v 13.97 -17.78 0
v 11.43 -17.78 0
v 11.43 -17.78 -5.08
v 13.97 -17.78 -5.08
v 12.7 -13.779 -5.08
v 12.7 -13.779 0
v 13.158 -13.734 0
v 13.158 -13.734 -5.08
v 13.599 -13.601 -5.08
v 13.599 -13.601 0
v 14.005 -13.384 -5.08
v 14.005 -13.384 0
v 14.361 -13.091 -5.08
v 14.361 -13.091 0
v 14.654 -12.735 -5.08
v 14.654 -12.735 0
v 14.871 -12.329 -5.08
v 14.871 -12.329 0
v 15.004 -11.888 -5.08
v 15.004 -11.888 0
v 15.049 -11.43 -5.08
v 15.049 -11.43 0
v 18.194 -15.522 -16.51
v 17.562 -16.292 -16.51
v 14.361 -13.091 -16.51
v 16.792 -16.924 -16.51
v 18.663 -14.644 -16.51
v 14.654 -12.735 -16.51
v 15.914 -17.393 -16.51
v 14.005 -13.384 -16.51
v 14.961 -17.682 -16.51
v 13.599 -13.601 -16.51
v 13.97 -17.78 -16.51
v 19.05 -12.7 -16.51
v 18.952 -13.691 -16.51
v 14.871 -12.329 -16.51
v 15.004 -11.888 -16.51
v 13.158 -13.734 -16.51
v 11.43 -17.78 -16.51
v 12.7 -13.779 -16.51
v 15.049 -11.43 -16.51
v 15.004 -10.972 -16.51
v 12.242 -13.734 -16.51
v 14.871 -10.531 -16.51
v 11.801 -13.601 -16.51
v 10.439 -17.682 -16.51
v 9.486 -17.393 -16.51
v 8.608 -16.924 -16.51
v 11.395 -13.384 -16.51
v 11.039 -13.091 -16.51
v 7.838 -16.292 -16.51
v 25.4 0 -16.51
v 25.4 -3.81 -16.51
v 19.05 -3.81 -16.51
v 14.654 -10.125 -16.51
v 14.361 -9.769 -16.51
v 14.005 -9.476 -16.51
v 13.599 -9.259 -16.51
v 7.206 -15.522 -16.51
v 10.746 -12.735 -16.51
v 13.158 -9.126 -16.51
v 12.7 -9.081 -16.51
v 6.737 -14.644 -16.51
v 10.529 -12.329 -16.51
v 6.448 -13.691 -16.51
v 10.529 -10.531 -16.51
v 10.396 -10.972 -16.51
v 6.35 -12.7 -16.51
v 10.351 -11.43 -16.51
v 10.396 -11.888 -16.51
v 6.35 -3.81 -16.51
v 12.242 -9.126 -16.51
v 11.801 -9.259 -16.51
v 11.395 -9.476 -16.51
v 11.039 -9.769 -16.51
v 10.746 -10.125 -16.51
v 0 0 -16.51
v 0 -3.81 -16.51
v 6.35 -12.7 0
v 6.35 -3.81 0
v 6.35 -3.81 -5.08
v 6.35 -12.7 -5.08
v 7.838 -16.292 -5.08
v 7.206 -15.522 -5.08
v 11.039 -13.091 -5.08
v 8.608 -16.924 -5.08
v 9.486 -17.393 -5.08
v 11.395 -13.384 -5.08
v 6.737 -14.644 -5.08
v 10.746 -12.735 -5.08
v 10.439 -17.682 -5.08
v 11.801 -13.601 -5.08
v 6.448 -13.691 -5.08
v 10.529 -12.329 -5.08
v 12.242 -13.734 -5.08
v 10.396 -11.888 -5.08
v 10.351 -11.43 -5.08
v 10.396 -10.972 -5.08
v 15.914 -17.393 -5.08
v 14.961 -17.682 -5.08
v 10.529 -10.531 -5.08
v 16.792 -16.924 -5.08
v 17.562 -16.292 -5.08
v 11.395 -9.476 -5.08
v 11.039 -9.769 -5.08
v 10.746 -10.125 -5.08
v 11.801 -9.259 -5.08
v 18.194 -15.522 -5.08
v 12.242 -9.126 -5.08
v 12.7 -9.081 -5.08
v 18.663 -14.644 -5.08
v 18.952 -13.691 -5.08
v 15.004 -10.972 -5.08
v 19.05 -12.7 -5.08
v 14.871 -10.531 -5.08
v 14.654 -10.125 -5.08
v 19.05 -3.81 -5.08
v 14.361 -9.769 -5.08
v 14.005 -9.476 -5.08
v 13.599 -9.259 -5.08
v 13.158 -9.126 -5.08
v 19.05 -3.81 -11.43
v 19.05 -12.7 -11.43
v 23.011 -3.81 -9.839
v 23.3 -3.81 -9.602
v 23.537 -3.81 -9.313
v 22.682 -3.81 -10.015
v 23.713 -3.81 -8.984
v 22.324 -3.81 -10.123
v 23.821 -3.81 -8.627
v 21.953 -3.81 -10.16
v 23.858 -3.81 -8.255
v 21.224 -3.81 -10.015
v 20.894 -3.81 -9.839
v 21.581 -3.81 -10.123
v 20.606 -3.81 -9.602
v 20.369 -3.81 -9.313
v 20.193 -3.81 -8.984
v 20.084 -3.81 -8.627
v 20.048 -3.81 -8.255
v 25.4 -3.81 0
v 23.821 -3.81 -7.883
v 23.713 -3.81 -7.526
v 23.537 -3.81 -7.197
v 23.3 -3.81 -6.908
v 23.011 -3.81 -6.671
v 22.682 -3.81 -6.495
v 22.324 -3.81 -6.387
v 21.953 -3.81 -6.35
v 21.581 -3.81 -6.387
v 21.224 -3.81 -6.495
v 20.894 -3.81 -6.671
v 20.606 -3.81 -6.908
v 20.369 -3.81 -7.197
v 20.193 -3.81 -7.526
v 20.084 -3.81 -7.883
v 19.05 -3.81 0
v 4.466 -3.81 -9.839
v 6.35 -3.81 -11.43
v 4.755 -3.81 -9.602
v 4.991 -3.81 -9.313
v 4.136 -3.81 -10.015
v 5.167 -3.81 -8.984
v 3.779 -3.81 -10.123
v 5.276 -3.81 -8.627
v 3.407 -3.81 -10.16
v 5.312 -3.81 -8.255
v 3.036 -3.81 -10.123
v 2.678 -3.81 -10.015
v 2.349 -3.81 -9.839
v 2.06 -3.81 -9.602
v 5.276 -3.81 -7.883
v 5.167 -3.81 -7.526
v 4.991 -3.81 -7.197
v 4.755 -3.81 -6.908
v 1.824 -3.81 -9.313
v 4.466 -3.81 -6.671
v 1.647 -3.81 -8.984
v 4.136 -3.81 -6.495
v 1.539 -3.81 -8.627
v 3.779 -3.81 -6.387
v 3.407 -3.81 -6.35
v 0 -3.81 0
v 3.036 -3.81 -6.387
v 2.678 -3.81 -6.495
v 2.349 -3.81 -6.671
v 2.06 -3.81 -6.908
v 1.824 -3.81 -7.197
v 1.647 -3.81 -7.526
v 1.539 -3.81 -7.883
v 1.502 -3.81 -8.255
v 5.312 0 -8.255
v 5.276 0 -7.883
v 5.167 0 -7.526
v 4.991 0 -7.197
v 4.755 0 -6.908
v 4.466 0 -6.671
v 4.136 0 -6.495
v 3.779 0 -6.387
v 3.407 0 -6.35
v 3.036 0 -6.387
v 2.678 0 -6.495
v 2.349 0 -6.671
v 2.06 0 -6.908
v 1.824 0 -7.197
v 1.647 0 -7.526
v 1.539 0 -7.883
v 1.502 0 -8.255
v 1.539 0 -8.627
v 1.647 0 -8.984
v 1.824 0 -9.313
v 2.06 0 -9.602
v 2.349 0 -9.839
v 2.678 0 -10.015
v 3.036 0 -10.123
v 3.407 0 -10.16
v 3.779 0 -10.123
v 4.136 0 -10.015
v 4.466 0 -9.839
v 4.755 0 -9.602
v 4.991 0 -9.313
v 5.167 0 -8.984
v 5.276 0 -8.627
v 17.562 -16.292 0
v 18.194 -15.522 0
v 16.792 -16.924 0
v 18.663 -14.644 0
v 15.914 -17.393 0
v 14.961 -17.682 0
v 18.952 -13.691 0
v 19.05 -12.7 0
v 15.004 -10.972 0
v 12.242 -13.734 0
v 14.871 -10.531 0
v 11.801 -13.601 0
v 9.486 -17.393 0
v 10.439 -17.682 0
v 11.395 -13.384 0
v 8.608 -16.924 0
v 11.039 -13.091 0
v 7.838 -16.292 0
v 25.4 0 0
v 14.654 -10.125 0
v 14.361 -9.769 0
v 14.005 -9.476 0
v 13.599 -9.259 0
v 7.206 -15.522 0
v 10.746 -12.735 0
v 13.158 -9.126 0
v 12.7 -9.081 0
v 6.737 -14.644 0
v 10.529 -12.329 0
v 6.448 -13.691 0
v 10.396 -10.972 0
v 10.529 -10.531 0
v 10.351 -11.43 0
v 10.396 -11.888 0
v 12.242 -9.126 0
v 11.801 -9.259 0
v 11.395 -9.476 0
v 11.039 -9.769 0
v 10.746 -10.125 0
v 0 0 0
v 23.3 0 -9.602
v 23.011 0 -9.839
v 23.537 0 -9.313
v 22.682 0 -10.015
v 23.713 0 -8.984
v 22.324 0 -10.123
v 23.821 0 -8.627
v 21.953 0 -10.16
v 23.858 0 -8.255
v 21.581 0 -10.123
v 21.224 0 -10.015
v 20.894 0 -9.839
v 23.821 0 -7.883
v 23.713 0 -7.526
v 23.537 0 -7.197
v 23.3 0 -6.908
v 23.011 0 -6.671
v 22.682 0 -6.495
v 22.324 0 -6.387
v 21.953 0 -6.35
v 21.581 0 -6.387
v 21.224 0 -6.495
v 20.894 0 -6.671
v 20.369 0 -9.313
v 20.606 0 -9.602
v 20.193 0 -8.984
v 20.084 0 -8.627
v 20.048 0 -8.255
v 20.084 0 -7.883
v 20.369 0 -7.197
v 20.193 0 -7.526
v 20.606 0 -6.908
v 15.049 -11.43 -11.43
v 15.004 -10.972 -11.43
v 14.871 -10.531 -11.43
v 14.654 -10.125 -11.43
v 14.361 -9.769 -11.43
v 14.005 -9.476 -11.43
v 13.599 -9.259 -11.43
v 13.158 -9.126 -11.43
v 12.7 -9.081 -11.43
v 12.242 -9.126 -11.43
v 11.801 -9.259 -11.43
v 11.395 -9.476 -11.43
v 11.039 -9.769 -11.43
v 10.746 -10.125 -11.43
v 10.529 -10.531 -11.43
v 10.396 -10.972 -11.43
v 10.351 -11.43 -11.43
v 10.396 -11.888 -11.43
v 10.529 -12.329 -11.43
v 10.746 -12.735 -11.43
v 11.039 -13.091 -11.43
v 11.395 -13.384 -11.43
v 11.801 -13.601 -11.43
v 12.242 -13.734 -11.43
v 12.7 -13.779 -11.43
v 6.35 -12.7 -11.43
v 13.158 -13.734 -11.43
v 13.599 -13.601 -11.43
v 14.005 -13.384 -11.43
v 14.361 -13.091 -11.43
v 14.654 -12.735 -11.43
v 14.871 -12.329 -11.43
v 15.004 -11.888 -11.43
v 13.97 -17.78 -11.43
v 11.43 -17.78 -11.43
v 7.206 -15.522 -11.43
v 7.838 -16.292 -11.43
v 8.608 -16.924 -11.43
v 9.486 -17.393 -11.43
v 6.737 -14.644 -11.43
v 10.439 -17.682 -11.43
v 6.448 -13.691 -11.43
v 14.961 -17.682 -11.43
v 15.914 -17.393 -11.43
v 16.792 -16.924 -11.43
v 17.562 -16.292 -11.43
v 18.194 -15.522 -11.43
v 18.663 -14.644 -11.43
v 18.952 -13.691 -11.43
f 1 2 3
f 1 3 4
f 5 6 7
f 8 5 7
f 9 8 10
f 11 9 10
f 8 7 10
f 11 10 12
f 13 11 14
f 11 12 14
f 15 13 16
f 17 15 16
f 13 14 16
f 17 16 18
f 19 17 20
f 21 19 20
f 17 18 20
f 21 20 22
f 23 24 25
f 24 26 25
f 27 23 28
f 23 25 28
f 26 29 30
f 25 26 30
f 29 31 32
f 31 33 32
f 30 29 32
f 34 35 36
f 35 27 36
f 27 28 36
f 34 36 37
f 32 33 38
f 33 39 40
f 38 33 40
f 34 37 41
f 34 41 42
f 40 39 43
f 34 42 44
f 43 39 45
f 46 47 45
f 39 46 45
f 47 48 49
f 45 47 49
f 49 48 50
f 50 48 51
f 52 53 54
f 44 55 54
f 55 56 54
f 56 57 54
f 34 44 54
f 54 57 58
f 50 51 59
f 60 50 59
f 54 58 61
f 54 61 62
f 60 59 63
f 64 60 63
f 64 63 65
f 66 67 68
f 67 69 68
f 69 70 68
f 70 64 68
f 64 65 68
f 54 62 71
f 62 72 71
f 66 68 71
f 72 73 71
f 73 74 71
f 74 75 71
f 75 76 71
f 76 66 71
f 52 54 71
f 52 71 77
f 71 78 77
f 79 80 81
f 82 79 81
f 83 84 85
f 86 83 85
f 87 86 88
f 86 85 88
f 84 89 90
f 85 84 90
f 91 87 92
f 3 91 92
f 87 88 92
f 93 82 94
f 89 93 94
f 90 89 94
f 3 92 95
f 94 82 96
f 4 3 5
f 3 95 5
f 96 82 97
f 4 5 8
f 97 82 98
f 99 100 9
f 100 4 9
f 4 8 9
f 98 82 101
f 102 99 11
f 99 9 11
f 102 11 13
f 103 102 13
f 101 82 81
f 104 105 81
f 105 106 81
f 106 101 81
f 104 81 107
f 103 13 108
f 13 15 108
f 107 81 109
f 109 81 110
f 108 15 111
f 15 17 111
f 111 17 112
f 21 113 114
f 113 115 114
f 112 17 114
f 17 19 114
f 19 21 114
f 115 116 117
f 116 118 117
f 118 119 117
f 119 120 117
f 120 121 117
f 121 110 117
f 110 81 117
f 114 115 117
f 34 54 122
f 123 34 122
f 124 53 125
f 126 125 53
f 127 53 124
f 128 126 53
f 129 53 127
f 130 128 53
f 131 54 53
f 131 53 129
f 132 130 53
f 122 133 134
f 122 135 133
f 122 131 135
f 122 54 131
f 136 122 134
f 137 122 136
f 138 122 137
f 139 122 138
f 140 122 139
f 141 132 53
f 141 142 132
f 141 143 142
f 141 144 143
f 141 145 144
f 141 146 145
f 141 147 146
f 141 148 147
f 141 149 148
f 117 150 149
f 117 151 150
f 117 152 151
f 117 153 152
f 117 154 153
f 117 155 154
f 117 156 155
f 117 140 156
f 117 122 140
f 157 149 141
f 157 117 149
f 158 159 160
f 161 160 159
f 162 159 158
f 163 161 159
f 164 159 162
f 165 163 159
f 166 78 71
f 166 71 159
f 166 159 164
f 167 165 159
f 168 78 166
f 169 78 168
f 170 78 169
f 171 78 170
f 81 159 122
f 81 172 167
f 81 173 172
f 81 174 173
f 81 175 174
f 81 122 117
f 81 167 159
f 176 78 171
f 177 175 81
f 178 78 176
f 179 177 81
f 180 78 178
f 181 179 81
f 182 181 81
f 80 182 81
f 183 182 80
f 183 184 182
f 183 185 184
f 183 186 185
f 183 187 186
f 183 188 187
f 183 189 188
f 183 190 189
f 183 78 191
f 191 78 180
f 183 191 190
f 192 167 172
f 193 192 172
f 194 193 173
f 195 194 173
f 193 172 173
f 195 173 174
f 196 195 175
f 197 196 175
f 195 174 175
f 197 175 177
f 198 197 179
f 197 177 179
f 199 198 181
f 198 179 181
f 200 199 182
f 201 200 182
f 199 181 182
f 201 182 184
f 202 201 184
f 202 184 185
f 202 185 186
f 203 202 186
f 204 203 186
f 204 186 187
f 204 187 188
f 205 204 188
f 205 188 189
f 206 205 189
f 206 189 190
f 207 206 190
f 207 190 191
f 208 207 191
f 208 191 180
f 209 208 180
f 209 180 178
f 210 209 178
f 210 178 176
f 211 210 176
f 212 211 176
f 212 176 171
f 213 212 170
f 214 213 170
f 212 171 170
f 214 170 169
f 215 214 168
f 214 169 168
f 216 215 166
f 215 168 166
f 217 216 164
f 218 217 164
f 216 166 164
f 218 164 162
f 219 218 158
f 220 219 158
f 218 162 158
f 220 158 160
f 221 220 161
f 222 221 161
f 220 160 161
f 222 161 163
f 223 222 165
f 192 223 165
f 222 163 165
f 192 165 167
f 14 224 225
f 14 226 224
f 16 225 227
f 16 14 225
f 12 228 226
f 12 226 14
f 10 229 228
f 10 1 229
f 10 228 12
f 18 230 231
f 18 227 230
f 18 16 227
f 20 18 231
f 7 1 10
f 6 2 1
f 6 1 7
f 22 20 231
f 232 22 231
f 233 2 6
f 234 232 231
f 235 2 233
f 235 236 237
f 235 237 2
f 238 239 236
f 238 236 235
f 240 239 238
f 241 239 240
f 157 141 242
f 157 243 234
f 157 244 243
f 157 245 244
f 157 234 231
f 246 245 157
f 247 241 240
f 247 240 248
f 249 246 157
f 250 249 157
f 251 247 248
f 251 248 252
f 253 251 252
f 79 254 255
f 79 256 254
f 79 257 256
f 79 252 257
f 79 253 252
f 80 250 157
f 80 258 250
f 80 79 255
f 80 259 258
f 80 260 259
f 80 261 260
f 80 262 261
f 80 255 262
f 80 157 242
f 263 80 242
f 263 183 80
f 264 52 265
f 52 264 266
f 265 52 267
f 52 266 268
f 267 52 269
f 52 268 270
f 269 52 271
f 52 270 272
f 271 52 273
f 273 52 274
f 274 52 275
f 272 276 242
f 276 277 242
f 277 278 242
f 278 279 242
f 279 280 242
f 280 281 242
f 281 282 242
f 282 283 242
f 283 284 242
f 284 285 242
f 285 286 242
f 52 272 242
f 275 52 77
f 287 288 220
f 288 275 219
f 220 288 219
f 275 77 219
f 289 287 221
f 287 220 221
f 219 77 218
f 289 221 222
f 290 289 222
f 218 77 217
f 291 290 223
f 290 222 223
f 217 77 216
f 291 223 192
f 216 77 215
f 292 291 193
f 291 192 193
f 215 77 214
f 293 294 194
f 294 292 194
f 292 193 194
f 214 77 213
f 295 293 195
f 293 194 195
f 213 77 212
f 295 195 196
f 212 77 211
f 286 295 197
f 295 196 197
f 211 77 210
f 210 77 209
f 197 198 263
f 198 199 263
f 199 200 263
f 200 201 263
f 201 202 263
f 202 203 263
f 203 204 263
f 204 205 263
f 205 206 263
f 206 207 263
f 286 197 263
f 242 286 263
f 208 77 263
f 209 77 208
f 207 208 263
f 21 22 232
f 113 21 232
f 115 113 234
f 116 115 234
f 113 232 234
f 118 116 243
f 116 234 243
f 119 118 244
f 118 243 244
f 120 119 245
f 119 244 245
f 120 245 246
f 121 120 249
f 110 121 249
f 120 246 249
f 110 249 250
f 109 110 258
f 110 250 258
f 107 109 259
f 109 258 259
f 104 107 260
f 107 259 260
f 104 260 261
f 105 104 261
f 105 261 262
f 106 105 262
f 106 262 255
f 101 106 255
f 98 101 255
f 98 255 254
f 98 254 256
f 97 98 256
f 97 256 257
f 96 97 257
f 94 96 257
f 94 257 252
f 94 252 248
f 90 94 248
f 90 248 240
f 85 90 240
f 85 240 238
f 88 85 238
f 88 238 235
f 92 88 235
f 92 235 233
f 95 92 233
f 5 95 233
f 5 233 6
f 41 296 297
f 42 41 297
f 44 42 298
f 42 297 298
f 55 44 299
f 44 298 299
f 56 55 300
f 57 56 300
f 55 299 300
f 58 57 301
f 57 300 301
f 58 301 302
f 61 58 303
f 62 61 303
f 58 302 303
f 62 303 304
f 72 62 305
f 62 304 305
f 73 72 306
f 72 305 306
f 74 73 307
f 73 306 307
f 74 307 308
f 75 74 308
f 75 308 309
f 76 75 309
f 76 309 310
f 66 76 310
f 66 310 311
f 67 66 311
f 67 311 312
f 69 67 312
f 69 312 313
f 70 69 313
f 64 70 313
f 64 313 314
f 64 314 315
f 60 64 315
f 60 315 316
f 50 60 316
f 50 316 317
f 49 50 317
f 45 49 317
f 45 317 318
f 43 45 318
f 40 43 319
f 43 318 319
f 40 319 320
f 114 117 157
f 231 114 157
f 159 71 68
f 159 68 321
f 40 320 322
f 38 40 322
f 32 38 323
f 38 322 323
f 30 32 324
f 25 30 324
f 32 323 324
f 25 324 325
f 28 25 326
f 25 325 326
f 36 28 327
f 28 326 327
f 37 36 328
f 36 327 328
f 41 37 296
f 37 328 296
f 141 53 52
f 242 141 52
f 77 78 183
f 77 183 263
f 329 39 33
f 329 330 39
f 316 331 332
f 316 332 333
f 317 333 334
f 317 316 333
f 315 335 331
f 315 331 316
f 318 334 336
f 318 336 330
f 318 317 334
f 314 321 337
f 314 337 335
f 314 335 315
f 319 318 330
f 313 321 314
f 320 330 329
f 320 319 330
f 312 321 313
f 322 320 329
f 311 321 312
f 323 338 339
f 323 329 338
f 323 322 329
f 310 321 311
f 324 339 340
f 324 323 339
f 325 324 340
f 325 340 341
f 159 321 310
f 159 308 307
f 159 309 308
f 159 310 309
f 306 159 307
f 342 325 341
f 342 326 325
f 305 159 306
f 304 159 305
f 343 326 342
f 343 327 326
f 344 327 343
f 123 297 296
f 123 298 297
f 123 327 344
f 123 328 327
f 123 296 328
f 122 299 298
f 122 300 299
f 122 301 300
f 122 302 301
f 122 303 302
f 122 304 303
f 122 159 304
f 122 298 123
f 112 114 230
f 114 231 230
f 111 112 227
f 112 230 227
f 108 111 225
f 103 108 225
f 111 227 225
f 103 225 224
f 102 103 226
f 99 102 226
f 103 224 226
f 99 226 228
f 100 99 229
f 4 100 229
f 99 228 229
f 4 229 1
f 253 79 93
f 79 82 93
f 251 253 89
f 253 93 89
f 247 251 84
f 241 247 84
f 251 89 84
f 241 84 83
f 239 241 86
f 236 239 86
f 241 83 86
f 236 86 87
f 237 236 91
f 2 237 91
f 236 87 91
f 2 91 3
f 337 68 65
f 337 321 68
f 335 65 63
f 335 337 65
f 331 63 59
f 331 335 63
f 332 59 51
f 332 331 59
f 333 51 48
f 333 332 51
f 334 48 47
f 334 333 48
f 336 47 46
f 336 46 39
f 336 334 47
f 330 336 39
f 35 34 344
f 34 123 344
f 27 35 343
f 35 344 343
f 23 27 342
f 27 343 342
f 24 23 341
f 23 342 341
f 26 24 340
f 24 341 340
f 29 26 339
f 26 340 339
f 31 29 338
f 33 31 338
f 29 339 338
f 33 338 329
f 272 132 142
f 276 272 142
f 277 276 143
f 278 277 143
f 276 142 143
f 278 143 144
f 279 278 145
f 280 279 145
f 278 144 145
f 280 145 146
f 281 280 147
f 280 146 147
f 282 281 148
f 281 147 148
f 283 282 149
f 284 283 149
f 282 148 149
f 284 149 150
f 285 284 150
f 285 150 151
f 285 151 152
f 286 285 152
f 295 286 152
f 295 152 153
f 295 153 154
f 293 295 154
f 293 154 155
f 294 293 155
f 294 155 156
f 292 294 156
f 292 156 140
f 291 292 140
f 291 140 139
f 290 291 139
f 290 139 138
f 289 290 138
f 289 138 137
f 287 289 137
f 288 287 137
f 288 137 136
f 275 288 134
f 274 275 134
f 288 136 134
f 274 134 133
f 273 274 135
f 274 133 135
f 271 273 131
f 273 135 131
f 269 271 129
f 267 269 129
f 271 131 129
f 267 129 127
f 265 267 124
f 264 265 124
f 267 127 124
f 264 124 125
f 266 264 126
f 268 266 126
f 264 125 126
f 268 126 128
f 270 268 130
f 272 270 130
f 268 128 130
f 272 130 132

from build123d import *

# Parameters (mm, degrees)
F0_W     = 3.81
F0_H     = 16.51
F1_DEPTH = 25.4
F2_W     = 12.7
F2_H     = 5.08
F3_DEPTH = 13.97
F4_R     = 5.08
F6_DEPTH = 25.4
F7_R     = 1.905
F8_DEPTH = 25.4


with BuildPart() as f1:
    # F0 (on Right) → F1 (new body)
    with BuildSketch(Plane.YZ):
        with Locations((-1.905, -8.255)):
            Rectangle(F0_W, F0_H)
    extrude(amount=F1_DEPTH)

    # F2 (on face) → F3 (join)
    with BuildSketch(Plane.XZ.offset(3.81)):
        Polygon((19.05, 0), (12.7, 0), (6.35, 0), (6.35, -5.08), (19.05, -5.08), align=None)
        with Locations((12.7, -13.97)):
            Rectangle(F2_W, F2_H)
    extrude(amount=F3_DEPTH)

    # F4
    f4_edges = [f1.edges().sort_by_distance(p)[0] for p in [
        (19.05, -17.78, -2.54),
        (6.35, -17.78, -2.54),
        (19.05, -17.78, -13.97),
        (6.35, -17.78, -13.97),
    ]]
    fillet(f4_edges, radius=F4_R)

    # F5 (on face) → F6 (cut)
    with BuildSketch(Plane.XY):
        with BuildLine():
            ThreePointArc((15.0495, -11.43), (11.038653, -9.768653), (12.7, -13.7795))
            ThreePointArc((12.7, -13.7795), (14.361347, -13.091347), (15.0495, -11.43))
        make_face()
    extrude(amount=-F6_DEPTH, mode=Mode.SUBTRACT)

    # F7 (on face) → F8 (cut)
    with BuildSketch(Plane.XZ.offset(3.81)):
        with Locations((3.407462, -8.255)):
            Circle(F7_R)
        with Locations((21.952828, -8.255)):
            Circle(F7_R)
    extrude(amount=-F8_DEPTH, mode=Mode.SUBTRACT)


solid = f1.part
